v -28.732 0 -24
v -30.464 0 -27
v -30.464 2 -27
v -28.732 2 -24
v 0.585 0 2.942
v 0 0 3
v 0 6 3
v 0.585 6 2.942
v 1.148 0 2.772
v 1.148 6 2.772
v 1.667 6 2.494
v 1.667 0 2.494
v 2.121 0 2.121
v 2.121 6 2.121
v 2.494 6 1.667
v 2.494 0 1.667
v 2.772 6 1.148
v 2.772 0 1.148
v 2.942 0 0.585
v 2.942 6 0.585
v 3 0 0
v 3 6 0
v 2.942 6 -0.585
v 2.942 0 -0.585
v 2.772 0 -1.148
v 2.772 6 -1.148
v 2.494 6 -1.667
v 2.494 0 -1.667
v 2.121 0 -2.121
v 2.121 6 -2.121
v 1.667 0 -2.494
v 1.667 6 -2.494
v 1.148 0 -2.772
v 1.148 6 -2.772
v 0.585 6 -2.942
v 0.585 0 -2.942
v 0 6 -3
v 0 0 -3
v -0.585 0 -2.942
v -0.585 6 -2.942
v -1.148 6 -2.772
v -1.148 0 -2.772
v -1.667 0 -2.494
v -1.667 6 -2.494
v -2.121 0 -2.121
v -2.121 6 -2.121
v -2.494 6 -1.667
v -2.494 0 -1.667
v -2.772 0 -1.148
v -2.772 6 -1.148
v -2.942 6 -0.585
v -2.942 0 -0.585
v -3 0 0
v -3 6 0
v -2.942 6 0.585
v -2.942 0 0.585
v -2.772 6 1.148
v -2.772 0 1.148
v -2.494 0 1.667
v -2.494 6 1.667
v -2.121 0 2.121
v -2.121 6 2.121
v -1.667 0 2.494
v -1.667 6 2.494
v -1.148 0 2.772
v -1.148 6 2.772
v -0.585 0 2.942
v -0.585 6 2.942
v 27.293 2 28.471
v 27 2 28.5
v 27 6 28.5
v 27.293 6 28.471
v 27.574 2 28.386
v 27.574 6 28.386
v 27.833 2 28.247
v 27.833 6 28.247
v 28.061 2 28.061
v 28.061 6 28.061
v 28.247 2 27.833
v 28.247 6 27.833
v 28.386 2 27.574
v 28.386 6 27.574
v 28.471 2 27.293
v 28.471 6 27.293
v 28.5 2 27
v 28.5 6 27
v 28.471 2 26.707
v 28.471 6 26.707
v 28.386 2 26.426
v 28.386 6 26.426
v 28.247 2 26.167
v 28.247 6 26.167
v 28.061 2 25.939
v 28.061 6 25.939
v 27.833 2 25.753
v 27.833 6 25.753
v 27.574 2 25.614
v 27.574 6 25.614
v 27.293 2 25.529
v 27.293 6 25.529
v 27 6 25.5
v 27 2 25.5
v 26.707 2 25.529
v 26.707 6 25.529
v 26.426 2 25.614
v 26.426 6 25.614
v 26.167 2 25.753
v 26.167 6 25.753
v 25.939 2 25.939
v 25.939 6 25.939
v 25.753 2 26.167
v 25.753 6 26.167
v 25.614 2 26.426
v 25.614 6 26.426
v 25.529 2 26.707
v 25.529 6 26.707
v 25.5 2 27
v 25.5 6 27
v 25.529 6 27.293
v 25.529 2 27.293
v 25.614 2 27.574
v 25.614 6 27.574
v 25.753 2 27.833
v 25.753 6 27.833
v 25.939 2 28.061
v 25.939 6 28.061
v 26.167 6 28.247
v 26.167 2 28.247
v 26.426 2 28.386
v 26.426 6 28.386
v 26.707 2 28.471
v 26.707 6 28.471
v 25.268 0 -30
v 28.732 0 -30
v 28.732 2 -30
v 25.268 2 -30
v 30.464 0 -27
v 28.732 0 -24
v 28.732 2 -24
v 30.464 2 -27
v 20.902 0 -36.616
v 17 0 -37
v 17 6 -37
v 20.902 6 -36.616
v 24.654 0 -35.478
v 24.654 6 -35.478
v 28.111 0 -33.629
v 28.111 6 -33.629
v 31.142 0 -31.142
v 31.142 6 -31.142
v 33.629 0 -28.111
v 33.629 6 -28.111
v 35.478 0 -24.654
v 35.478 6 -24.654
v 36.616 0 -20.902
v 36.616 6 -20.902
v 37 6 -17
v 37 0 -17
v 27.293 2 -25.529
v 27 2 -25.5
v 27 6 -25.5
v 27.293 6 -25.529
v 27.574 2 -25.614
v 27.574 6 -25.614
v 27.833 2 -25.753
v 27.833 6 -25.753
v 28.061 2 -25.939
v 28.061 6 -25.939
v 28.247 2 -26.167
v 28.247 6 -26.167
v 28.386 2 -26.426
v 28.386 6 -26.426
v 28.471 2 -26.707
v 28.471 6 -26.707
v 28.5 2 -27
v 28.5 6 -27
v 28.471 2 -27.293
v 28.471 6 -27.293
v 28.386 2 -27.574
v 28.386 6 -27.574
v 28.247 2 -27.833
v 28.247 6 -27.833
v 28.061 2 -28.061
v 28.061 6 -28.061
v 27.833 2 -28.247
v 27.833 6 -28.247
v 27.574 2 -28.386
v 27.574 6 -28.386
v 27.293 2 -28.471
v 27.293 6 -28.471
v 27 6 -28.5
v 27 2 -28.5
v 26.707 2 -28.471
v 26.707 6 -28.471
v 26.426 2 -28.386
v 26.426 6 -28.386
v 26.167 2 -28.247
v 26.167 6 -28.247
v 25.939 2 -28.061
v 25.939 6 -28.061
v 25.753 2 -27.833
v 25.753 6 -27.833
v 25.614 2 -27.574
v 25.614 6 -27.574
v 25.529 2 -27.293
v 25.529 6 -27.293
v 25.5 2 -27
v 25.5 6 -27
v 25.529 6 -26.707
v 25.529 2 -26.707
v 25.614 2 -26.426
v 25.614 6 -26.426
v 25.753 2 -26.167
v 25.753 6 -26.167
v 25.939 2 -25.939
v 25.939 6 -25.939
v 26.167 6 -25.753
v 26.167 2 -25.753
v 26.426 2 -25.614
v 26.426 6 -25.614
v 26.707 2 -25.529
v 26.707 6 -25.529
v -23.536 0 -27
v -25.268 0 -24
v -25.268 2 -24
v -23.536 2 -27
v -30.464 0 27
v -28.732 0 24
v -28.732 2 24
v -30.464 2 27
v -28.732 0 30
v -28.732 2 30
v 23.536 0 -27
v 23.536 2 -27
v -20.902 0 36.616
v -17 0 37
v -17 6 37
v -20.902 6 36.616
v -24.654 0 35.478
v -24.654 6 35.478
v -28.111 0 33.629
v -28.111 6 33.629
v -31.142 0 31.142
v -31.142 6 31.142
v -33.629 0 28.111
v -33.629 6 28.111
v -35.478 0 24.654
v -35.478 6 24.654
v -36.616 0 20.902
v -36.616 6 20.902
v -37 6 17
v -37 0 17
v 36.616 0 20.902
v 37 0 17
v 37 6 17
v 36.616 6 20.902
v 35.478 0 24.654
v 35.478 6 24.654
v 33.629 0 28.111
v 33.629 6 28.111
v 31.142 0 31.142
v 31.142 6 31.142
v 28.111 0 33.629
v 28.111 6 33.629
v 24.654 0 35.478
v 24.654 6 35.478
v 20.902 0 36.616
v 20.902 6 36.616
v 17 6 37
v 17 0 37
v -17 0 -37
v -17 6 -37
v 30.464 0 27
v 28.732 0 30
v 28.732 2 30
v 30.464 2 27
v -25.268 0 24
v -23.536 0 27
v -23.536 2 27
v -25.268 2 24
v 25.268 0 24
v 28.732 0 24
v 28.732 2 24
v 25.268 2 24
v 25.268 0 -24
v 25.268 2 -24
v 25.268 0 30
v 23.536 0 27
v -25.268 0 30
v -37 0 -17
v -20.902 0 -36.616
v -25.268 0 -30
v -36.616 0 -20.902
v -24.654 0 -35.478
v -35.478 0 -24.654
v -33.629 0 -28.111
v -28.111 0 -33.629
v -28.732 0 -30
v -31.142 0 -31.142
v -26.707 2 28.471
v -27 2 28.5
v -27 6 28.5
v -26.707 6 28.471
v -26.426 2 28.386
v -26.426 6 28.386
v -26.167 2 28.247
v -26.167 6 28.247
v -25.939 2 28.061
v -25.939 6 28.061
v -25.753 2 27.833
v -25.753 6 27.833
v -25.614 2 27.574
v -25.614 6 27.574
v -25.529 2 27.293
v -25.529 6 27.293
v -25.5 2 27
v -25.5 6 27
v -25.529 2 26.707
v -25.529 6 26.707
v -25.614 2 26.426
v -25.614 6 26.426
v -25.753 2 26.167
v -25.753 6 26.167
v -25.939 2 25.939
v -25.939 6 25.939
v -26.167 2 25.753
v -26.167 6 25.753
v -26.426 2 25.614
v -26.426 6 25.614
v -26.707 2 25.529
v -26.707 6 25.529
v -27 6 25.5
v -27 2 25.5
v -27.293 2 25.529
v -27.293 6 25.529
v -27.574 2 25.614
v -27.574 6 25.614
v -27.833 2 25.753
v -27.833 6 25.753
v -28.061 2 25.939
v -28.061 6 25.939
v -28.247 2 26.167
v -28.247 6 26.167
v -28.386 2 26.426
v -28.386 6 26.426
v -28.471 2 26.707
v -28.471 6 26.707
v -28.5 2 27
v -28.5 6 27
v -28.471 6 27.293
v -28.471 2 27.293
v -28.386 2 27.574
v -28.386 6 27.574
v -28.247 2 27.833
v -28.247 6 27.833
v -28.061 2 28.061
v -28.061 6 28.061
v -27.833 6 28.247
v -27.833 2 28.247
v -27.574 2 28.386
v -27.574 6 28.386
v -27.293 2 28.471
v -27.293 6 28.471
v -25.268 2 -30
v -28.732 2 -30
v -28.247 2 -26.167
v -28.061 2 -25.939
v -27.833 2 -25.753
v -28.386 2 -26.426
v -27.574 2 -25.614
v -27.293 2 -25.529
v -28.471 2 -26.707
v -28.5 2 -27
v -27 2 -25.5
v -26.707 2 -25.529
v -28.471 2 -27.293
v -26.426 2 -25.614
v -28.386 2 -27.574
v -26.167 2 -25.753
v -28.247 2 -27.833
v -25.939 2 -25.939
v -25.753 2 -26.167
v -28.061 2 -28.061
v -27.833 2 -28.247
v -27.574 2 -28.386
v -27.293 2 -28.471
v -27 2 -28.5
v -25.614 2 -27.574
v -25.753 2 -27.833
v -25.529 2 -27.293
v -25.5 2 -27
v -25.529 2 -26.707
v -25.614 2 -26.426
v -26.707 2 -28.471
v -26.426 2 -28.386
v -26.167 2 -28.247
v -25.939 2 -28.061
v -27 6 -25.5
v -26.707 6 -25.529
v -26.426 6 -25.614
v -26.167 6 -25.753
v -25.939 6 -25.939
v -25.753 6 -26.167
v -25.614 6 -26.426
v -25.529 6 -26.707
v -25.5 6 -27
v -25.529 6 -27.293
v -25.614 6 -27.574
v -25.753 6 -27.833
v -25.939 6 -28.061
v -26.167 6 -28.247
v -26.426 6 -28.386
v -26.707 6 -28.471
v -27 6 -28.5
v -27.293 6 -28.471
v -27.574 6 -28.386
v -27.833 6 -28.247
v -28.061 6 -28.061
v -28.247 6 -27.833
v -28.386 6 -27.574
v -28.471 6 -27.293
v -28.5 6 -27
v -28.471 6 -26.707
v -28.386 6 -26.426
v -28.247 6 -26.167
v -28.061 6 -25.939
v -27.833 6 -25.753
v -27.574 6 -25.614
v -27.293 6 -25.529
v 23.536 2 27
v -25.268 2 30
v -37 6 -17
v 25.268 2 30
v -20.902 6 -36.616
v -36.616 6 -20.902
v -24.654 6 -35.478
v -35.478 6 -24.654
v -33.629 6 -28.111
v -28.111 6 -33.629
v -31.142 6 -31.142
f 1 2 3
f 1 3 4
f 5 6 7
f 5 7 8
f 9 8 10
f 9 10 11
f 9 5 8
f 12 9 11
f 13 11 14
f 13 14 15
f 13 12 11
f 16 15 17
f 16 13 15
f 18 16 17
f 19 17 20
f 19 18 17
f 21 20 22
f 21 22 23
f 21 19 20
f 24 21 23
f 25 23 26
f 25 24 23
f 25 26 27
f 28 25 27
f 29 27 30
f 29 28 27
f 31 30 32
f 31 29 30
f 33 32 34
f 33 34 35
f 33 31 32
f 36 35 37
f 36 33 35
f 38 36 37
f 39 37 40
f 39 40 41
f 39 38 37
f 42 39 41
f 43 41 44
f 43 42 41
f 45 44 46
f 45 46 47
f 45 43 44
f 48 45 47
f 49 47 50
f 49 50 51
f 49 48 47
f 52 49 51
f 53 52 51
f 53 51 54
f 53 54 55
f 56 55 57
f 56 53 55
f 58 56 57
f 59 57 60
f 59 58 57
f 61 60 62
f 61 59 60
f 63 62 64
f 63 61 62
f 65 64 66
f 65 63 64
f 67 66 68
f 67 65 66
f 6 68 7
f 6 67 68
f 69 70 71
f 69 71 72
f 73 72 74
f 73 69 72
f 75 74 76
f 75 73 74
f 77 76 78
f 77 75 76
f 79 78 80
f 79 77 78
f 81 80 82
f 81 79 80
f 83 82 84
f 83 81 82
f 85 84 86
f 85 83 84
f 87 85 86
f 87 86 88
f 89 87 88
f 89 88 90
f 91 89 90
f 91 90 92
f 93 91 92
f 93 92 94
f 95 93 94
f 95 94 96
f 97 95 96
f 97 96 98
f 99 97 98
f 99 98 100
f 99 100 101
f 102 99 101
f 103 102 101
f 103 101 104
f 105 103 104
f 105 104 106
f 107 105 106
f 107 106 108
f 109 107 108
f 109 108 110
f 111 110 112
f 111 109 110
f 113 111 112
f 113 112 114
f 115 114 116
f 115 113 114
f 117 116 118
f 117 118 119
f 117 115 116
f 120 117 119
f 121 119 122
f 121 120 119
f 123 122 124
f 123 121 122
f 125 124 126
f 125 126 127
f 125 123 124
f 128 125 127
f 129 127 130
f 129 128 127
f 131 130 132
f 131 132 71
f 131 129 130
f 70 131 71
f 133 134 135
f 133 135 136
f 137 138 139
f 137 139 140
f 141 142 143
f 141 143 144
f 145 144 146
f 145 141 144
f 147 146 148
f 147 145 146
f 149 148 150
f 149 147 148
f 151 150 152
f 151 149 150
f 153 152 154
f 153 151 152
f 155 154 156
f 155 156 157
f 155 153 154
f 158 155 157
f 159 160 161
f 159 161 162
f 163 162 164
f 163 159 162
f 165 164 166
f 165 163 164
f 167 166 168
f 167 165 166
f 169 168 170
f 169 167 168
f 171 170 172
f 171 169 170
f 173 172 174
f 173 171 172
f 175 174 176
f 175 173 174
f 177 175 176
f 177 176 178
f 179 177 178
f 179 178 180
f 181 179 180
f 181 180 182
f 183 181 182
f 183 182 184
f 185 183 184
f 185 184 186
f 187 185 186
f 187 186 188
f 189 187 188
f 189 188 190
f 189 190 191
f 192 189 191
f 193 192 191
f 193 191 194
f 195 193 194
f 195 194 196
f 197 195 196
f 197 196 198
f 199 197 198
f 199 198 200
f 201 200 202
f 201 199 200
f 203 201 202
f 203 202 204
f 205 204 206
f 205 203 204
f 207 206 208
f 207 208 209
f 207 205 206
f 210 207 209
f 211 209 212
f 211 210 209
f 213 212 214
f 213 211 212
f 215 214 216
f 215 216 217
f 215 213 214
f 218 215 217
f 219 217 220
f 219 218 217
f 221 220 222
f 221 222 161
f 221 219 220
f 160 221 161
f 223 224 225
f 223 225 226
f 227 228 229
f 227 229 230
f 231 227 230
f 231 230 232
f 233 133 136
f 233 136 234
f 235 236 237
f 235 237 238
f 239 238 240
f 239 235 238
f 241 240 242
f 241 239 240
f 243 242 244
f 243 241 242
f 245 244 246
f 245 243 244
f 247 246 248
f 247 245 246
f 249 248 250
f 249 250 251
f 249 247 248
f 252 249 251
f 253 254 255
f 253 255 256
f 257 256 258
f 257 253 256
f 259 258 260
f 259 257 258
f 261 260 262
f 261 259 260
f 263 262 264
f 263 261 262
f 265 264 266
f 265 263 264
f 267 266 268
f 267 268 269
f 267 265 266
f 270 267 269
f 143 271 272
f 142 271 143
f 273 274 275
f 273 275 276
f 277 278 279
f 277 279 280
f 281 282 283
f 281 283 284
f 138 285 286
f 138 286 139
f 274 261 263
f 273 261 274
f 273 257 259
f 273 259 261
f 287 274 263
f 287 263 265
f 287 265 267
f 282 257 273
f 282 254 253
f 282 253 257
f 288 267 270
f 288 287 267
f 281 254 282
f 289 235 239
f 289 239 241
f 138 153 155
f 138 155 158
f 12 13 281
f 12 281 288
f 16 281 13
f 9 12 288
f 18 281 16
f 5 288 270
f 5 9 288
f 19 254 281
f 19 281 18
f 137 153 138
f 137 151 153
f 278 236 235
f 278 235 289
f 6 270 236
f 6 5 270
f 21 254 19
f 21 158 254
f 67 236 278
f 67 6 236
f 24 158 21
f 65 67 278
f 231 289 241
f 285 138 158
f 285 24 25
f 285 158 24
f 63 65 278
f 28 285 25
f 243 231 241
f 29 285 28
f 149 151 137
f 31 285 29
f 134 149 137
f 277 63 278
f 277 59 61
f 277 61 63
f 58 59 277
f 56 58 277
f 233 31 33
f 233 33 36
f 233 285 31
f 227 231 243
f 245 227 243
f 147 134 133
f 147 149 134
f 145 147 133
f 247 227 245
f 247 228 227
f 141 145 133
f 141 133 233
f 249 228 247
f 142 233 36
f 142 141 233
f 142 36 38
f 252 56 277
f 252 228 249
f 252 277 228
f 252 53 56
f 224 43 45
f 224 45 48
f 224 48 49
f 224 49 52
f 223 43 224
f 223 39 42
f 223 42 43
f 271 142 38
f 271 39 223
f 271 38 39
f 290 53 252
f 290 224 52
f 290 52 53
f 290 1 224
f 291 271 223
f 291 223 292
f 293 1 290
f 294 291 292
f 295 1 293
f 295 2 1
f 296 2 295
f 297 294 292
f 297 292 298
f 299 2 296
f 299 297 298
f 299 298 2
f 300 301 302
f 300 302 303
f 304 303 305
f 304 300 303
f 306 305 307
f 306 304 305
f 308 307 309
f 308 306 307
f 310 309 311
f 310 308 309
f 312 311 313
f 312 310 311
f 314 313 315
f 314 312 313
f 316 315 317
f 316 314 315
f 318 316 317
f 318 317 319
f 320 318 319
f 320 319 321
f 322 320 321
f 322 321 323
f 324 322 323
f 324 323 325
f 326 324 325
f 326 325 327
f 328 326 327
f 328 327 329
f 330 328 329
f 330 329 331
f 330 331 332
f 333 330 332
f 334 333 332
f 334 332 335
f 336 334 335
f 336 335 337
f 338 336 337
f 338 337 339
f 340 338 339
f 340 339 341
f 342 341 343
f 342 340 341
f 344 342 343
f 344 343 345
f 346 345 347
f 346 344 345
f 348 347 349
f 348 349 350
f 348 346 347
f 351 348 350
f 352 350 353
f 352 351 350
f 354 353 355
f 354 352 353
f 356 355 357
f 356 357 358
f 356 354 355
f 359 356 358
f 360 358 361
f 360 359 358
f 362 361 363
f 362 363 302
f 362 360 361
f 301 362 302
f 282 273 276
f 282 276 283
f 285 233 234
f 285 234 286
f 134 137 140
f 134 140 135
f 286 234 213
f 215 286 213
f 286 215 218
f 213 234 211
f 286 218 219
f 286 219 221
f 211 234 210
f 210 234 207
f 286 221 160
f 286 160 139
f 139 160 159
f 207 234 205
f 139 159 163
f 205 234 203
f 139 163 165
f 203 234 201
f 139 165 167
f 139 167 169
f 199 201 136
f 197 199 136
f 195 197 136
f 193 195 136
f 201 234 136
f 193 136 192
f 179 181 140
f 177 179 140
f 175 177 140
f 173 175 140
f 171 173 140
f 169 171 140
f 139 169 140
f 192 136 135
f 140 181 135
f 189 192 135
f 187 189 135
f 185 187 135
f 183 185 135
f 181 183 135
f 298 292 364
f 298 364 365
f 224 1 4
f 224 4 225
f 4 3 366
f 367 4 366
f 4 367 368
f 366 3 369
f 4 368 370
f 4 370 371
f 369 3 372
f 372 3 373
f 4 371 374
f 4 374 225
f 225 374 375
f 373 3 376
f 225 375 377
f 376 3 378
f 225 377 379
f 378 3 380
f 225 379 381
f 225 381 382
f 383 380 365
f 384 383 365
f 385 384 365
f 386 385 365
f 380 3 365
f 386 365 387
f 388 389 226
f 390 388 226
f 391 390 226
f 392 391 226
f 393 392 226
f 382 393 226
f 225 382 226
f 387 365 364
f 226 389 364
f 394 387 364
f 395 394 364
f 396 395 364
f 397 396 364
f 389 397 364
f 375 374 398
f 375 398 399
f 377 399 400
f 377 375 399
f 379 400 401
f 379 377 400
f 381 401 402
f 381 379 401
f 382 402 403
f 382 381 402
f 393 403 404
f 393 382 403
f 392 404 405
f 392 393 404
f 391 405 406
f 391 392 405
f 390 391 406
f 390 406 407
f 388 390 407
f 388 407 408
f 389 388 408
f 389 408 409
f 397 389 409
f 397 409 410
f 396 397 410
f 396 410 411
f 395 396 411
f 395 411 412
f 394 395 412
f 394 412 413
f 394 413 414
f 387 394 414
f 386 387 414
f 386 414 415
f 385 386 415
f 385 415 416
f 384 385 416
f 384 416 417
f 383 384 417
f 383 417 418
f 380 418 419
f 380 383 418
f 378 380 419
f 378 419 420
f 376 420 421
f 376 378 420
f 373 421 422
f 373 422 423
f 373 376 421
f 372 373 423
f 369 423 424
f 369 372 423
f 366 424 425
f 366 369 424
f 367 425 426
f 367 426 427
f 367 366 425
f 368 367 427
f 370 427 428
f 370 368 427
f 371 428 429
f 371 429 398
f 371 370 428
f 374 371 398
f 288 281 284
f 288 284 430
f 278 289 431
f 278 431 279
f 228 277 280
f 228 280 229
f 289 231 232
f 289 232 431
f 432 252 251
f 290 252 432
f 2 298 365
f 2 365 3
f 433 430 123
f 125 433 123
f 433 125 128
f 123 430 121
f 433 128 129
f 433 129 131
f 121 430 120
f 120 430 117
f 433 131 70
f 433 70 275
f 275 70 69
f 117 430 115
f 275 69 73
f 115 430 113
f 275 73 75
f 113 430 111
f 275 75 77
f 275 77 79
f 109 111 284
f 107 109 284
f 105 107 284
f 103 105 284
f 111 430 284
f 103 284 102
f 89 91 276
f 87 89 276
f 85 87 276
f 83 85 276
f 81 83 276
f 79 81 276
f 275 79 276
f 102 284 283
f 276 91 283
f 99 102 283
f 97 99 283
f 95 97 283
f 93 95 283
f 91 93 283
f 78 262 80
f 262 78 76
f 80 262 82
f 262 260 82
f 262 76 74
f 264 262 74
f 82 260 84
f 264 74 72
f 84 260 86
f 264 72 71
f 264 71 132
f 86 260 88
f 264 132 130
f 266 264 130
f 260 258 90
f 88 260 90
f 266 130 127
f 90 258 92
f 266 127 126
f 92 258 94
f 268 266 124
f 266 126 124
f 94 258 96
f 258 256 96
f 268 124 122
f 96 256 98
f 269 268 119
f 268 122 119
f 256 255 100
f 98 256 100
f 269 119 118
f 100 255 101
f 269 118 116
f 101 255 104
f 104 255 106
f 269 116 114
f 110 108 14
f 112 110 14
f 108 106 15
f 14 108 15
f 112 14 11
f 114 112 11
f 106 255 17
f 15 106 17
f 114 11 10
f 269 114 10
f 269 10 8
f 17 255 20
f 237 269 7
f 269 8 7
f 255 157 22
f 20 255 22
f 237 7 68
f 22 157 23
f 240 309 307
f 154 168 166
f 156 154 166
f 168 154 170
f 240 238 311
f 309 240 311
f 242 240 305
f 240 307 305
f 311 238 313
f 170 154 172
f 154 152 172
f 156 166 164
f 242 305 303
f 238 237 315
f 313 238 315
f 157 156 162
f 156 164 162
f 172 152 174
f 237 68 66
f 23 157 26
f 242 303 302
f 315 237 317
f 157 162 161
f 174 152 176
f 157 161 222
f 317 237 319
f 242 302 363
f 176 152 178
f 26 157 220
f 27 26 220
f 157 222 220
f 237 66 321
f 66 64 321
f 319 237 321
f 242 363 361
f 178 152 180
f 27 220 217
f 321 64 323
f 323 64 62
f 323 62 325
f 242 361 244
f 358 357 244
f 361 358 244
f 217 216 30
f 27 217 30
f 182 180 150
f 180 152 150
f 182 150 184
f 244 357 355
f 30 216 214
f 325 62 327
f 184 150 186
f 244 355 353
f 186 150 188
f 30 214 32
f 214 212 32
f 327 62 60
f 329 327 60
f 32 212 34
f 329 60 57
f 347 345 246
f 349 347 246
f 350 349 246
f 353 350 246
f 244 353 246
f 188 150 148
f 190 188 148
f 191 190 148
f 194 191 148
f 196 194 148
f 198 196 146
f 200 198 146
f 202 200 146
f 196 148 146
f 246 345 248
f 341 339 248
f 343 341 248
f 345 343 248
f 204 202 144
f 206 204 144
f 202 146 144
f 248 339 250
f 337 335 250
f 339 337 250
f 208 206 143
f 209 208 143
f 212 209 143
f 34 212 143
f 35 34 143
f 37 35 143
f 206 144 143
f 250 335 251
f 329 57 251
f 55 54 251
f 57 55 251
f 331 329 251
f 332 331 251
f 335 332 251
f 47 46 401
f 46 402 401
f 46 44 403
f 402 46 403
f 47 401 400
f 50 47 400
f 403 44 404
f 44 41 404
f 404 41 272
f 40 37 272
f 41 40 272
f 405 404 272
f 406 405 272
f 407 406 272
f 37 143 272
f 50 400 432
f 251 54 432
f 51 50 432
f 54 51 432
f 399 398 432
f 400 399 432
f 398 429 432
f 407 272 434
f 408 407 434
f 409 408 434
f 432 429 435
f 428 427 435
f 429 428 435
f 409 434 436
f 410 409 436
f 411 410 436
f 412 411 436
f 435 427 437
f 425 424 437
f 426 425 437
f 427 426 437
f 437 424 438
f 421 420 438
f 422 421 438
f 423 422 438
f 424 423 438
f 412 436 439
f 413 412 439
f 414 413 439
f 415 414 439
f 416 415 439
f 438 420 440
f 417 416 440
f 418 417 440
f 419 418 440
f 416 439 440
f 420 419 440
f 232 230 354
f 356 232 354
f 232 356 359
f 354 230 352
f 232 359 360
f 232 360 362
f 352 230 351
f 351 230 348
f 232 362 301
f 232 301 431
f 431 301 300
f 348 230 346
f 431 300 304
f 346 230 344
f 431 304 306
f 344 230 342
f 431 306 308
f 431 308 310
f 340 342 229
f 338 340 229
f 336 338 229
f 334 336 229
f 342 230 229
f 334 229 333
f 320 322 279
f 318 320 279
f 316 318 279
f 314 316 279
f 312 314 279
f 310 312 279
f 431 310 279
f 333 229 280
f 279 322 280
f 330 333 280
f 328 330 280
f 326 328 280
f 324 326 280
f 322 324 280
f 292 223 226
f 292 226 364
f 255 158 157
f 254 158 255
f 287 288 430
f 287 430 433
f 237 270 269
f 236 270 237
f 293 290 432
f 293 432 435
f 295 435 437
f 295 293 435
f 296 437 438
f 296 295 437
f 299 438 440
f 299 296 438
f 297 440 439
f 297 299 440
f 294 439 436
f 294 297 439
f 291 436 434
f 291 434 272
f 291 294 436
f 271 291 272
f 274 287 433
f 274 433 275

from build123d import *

# Parameters (mm, degrees)
EXTRUDE_1_DEPTH     = 6
SKETCH_2_R          = 1.5
SKETCH_2_R_2        = 3
CUT_EXTRUDE_1_DEPTH = 6
CUT_EXTRUDE_2_DEPTH = 2


with BuildPart() as part:
    # Эскиз1 → Бобышка-Вытянуть1 (new body)
    with BuildSketch(Plane(origin=(0, 0, 0), x_dir=(1, 0, 0), z_dir=(0, 1, 0))):
        with BuildLine():
            Line((17, -37), (-17, -37))
            ThreePointArc((-17, -37), (-31.142135624, -31.142135624), (-37, -17))
            Line((-37, -17), (-37, 17))
            ThreePointArc((-37, 17), (-31.142135624, 31.142135624), (-17, 37))
            Line((-17, 37), (17, 37))
            ThreePointArc((17, 37), (31.142135624, 31.142135624), (37, 17))
            Line((37, 17), (37, -17))
            ThreePointArc((37, -17), (31.142135624, -31.142135624), (17, -37))
        make_face()
    extrude(amount=EXTRUDE_1_DEPTH)

    # Эскиз2 → Вырез-Вытянуть1 (cut)
    with BuildSketch(Plane(origin=(0, 0, 0), x_dir=(1, 0, 0), z_dir=(0, 1, 0))):
        with Locations(Location((-27, 27, 0), (0, 0, 270))):
            Circle(SKETCH_2_R)
        with Locations(Location((27, 27, 0), (0, 0, 270))):
            Circle(SKETCH_2_R)
        with Locations(Location((27, -27, 0), (0, 0, 270))):
            Circle(SKETCH_2_R)
        with Locations(Location((-27, -27, 0), (0, 0, 270))):
            Circle(SKETCH_2_R)
        with Locations(Location((0, 0, 0), (0, 0, 270))):
            Circle(SKETCH_2_R_2)
    extrude(amount=CUT_EXTRUDE_1_DEPTH, mode=Mode.SUBTRACT)

    # Эскиз3 → Вырез-Вытянуть2 (cut)
    with BuildSketch(Plane(origin=(0, 0, 0), x_dir=(1, 0, 0), z_dir=(0, 1, 0))):
        Polygon((-28.732050808, 30), (-30.464101615, 27), (-28.732050808, 24), (-25.267949192, 24), (-23.535898385, 27), (-25.267949192, 30), align=None)
        Polygon((25.267949192, 30), (23.535898385, 27), (25.267949192, 24), (28.732050808, 24), (30.464101615, 27), (28.732050808, 30), align=None)
        Polygon((25.267949192, -24), (23.535898385, -27), (25.267949192, -30), (28.732050808, -30), (30.464101615, -27), (28.732050808, -24), align=None)
        Polygon((-28.732050808, -24), (-30.464101615, -27), (-28.732050808, -30), (-25.267949192, -30), (-23.535898385, -27), (-25.267949192, -24), align=None)
    extrude(amount=CUT_EXTRUDE_2_DEPTH, mode=Mode.SUBTRACT)


solid = part.part
